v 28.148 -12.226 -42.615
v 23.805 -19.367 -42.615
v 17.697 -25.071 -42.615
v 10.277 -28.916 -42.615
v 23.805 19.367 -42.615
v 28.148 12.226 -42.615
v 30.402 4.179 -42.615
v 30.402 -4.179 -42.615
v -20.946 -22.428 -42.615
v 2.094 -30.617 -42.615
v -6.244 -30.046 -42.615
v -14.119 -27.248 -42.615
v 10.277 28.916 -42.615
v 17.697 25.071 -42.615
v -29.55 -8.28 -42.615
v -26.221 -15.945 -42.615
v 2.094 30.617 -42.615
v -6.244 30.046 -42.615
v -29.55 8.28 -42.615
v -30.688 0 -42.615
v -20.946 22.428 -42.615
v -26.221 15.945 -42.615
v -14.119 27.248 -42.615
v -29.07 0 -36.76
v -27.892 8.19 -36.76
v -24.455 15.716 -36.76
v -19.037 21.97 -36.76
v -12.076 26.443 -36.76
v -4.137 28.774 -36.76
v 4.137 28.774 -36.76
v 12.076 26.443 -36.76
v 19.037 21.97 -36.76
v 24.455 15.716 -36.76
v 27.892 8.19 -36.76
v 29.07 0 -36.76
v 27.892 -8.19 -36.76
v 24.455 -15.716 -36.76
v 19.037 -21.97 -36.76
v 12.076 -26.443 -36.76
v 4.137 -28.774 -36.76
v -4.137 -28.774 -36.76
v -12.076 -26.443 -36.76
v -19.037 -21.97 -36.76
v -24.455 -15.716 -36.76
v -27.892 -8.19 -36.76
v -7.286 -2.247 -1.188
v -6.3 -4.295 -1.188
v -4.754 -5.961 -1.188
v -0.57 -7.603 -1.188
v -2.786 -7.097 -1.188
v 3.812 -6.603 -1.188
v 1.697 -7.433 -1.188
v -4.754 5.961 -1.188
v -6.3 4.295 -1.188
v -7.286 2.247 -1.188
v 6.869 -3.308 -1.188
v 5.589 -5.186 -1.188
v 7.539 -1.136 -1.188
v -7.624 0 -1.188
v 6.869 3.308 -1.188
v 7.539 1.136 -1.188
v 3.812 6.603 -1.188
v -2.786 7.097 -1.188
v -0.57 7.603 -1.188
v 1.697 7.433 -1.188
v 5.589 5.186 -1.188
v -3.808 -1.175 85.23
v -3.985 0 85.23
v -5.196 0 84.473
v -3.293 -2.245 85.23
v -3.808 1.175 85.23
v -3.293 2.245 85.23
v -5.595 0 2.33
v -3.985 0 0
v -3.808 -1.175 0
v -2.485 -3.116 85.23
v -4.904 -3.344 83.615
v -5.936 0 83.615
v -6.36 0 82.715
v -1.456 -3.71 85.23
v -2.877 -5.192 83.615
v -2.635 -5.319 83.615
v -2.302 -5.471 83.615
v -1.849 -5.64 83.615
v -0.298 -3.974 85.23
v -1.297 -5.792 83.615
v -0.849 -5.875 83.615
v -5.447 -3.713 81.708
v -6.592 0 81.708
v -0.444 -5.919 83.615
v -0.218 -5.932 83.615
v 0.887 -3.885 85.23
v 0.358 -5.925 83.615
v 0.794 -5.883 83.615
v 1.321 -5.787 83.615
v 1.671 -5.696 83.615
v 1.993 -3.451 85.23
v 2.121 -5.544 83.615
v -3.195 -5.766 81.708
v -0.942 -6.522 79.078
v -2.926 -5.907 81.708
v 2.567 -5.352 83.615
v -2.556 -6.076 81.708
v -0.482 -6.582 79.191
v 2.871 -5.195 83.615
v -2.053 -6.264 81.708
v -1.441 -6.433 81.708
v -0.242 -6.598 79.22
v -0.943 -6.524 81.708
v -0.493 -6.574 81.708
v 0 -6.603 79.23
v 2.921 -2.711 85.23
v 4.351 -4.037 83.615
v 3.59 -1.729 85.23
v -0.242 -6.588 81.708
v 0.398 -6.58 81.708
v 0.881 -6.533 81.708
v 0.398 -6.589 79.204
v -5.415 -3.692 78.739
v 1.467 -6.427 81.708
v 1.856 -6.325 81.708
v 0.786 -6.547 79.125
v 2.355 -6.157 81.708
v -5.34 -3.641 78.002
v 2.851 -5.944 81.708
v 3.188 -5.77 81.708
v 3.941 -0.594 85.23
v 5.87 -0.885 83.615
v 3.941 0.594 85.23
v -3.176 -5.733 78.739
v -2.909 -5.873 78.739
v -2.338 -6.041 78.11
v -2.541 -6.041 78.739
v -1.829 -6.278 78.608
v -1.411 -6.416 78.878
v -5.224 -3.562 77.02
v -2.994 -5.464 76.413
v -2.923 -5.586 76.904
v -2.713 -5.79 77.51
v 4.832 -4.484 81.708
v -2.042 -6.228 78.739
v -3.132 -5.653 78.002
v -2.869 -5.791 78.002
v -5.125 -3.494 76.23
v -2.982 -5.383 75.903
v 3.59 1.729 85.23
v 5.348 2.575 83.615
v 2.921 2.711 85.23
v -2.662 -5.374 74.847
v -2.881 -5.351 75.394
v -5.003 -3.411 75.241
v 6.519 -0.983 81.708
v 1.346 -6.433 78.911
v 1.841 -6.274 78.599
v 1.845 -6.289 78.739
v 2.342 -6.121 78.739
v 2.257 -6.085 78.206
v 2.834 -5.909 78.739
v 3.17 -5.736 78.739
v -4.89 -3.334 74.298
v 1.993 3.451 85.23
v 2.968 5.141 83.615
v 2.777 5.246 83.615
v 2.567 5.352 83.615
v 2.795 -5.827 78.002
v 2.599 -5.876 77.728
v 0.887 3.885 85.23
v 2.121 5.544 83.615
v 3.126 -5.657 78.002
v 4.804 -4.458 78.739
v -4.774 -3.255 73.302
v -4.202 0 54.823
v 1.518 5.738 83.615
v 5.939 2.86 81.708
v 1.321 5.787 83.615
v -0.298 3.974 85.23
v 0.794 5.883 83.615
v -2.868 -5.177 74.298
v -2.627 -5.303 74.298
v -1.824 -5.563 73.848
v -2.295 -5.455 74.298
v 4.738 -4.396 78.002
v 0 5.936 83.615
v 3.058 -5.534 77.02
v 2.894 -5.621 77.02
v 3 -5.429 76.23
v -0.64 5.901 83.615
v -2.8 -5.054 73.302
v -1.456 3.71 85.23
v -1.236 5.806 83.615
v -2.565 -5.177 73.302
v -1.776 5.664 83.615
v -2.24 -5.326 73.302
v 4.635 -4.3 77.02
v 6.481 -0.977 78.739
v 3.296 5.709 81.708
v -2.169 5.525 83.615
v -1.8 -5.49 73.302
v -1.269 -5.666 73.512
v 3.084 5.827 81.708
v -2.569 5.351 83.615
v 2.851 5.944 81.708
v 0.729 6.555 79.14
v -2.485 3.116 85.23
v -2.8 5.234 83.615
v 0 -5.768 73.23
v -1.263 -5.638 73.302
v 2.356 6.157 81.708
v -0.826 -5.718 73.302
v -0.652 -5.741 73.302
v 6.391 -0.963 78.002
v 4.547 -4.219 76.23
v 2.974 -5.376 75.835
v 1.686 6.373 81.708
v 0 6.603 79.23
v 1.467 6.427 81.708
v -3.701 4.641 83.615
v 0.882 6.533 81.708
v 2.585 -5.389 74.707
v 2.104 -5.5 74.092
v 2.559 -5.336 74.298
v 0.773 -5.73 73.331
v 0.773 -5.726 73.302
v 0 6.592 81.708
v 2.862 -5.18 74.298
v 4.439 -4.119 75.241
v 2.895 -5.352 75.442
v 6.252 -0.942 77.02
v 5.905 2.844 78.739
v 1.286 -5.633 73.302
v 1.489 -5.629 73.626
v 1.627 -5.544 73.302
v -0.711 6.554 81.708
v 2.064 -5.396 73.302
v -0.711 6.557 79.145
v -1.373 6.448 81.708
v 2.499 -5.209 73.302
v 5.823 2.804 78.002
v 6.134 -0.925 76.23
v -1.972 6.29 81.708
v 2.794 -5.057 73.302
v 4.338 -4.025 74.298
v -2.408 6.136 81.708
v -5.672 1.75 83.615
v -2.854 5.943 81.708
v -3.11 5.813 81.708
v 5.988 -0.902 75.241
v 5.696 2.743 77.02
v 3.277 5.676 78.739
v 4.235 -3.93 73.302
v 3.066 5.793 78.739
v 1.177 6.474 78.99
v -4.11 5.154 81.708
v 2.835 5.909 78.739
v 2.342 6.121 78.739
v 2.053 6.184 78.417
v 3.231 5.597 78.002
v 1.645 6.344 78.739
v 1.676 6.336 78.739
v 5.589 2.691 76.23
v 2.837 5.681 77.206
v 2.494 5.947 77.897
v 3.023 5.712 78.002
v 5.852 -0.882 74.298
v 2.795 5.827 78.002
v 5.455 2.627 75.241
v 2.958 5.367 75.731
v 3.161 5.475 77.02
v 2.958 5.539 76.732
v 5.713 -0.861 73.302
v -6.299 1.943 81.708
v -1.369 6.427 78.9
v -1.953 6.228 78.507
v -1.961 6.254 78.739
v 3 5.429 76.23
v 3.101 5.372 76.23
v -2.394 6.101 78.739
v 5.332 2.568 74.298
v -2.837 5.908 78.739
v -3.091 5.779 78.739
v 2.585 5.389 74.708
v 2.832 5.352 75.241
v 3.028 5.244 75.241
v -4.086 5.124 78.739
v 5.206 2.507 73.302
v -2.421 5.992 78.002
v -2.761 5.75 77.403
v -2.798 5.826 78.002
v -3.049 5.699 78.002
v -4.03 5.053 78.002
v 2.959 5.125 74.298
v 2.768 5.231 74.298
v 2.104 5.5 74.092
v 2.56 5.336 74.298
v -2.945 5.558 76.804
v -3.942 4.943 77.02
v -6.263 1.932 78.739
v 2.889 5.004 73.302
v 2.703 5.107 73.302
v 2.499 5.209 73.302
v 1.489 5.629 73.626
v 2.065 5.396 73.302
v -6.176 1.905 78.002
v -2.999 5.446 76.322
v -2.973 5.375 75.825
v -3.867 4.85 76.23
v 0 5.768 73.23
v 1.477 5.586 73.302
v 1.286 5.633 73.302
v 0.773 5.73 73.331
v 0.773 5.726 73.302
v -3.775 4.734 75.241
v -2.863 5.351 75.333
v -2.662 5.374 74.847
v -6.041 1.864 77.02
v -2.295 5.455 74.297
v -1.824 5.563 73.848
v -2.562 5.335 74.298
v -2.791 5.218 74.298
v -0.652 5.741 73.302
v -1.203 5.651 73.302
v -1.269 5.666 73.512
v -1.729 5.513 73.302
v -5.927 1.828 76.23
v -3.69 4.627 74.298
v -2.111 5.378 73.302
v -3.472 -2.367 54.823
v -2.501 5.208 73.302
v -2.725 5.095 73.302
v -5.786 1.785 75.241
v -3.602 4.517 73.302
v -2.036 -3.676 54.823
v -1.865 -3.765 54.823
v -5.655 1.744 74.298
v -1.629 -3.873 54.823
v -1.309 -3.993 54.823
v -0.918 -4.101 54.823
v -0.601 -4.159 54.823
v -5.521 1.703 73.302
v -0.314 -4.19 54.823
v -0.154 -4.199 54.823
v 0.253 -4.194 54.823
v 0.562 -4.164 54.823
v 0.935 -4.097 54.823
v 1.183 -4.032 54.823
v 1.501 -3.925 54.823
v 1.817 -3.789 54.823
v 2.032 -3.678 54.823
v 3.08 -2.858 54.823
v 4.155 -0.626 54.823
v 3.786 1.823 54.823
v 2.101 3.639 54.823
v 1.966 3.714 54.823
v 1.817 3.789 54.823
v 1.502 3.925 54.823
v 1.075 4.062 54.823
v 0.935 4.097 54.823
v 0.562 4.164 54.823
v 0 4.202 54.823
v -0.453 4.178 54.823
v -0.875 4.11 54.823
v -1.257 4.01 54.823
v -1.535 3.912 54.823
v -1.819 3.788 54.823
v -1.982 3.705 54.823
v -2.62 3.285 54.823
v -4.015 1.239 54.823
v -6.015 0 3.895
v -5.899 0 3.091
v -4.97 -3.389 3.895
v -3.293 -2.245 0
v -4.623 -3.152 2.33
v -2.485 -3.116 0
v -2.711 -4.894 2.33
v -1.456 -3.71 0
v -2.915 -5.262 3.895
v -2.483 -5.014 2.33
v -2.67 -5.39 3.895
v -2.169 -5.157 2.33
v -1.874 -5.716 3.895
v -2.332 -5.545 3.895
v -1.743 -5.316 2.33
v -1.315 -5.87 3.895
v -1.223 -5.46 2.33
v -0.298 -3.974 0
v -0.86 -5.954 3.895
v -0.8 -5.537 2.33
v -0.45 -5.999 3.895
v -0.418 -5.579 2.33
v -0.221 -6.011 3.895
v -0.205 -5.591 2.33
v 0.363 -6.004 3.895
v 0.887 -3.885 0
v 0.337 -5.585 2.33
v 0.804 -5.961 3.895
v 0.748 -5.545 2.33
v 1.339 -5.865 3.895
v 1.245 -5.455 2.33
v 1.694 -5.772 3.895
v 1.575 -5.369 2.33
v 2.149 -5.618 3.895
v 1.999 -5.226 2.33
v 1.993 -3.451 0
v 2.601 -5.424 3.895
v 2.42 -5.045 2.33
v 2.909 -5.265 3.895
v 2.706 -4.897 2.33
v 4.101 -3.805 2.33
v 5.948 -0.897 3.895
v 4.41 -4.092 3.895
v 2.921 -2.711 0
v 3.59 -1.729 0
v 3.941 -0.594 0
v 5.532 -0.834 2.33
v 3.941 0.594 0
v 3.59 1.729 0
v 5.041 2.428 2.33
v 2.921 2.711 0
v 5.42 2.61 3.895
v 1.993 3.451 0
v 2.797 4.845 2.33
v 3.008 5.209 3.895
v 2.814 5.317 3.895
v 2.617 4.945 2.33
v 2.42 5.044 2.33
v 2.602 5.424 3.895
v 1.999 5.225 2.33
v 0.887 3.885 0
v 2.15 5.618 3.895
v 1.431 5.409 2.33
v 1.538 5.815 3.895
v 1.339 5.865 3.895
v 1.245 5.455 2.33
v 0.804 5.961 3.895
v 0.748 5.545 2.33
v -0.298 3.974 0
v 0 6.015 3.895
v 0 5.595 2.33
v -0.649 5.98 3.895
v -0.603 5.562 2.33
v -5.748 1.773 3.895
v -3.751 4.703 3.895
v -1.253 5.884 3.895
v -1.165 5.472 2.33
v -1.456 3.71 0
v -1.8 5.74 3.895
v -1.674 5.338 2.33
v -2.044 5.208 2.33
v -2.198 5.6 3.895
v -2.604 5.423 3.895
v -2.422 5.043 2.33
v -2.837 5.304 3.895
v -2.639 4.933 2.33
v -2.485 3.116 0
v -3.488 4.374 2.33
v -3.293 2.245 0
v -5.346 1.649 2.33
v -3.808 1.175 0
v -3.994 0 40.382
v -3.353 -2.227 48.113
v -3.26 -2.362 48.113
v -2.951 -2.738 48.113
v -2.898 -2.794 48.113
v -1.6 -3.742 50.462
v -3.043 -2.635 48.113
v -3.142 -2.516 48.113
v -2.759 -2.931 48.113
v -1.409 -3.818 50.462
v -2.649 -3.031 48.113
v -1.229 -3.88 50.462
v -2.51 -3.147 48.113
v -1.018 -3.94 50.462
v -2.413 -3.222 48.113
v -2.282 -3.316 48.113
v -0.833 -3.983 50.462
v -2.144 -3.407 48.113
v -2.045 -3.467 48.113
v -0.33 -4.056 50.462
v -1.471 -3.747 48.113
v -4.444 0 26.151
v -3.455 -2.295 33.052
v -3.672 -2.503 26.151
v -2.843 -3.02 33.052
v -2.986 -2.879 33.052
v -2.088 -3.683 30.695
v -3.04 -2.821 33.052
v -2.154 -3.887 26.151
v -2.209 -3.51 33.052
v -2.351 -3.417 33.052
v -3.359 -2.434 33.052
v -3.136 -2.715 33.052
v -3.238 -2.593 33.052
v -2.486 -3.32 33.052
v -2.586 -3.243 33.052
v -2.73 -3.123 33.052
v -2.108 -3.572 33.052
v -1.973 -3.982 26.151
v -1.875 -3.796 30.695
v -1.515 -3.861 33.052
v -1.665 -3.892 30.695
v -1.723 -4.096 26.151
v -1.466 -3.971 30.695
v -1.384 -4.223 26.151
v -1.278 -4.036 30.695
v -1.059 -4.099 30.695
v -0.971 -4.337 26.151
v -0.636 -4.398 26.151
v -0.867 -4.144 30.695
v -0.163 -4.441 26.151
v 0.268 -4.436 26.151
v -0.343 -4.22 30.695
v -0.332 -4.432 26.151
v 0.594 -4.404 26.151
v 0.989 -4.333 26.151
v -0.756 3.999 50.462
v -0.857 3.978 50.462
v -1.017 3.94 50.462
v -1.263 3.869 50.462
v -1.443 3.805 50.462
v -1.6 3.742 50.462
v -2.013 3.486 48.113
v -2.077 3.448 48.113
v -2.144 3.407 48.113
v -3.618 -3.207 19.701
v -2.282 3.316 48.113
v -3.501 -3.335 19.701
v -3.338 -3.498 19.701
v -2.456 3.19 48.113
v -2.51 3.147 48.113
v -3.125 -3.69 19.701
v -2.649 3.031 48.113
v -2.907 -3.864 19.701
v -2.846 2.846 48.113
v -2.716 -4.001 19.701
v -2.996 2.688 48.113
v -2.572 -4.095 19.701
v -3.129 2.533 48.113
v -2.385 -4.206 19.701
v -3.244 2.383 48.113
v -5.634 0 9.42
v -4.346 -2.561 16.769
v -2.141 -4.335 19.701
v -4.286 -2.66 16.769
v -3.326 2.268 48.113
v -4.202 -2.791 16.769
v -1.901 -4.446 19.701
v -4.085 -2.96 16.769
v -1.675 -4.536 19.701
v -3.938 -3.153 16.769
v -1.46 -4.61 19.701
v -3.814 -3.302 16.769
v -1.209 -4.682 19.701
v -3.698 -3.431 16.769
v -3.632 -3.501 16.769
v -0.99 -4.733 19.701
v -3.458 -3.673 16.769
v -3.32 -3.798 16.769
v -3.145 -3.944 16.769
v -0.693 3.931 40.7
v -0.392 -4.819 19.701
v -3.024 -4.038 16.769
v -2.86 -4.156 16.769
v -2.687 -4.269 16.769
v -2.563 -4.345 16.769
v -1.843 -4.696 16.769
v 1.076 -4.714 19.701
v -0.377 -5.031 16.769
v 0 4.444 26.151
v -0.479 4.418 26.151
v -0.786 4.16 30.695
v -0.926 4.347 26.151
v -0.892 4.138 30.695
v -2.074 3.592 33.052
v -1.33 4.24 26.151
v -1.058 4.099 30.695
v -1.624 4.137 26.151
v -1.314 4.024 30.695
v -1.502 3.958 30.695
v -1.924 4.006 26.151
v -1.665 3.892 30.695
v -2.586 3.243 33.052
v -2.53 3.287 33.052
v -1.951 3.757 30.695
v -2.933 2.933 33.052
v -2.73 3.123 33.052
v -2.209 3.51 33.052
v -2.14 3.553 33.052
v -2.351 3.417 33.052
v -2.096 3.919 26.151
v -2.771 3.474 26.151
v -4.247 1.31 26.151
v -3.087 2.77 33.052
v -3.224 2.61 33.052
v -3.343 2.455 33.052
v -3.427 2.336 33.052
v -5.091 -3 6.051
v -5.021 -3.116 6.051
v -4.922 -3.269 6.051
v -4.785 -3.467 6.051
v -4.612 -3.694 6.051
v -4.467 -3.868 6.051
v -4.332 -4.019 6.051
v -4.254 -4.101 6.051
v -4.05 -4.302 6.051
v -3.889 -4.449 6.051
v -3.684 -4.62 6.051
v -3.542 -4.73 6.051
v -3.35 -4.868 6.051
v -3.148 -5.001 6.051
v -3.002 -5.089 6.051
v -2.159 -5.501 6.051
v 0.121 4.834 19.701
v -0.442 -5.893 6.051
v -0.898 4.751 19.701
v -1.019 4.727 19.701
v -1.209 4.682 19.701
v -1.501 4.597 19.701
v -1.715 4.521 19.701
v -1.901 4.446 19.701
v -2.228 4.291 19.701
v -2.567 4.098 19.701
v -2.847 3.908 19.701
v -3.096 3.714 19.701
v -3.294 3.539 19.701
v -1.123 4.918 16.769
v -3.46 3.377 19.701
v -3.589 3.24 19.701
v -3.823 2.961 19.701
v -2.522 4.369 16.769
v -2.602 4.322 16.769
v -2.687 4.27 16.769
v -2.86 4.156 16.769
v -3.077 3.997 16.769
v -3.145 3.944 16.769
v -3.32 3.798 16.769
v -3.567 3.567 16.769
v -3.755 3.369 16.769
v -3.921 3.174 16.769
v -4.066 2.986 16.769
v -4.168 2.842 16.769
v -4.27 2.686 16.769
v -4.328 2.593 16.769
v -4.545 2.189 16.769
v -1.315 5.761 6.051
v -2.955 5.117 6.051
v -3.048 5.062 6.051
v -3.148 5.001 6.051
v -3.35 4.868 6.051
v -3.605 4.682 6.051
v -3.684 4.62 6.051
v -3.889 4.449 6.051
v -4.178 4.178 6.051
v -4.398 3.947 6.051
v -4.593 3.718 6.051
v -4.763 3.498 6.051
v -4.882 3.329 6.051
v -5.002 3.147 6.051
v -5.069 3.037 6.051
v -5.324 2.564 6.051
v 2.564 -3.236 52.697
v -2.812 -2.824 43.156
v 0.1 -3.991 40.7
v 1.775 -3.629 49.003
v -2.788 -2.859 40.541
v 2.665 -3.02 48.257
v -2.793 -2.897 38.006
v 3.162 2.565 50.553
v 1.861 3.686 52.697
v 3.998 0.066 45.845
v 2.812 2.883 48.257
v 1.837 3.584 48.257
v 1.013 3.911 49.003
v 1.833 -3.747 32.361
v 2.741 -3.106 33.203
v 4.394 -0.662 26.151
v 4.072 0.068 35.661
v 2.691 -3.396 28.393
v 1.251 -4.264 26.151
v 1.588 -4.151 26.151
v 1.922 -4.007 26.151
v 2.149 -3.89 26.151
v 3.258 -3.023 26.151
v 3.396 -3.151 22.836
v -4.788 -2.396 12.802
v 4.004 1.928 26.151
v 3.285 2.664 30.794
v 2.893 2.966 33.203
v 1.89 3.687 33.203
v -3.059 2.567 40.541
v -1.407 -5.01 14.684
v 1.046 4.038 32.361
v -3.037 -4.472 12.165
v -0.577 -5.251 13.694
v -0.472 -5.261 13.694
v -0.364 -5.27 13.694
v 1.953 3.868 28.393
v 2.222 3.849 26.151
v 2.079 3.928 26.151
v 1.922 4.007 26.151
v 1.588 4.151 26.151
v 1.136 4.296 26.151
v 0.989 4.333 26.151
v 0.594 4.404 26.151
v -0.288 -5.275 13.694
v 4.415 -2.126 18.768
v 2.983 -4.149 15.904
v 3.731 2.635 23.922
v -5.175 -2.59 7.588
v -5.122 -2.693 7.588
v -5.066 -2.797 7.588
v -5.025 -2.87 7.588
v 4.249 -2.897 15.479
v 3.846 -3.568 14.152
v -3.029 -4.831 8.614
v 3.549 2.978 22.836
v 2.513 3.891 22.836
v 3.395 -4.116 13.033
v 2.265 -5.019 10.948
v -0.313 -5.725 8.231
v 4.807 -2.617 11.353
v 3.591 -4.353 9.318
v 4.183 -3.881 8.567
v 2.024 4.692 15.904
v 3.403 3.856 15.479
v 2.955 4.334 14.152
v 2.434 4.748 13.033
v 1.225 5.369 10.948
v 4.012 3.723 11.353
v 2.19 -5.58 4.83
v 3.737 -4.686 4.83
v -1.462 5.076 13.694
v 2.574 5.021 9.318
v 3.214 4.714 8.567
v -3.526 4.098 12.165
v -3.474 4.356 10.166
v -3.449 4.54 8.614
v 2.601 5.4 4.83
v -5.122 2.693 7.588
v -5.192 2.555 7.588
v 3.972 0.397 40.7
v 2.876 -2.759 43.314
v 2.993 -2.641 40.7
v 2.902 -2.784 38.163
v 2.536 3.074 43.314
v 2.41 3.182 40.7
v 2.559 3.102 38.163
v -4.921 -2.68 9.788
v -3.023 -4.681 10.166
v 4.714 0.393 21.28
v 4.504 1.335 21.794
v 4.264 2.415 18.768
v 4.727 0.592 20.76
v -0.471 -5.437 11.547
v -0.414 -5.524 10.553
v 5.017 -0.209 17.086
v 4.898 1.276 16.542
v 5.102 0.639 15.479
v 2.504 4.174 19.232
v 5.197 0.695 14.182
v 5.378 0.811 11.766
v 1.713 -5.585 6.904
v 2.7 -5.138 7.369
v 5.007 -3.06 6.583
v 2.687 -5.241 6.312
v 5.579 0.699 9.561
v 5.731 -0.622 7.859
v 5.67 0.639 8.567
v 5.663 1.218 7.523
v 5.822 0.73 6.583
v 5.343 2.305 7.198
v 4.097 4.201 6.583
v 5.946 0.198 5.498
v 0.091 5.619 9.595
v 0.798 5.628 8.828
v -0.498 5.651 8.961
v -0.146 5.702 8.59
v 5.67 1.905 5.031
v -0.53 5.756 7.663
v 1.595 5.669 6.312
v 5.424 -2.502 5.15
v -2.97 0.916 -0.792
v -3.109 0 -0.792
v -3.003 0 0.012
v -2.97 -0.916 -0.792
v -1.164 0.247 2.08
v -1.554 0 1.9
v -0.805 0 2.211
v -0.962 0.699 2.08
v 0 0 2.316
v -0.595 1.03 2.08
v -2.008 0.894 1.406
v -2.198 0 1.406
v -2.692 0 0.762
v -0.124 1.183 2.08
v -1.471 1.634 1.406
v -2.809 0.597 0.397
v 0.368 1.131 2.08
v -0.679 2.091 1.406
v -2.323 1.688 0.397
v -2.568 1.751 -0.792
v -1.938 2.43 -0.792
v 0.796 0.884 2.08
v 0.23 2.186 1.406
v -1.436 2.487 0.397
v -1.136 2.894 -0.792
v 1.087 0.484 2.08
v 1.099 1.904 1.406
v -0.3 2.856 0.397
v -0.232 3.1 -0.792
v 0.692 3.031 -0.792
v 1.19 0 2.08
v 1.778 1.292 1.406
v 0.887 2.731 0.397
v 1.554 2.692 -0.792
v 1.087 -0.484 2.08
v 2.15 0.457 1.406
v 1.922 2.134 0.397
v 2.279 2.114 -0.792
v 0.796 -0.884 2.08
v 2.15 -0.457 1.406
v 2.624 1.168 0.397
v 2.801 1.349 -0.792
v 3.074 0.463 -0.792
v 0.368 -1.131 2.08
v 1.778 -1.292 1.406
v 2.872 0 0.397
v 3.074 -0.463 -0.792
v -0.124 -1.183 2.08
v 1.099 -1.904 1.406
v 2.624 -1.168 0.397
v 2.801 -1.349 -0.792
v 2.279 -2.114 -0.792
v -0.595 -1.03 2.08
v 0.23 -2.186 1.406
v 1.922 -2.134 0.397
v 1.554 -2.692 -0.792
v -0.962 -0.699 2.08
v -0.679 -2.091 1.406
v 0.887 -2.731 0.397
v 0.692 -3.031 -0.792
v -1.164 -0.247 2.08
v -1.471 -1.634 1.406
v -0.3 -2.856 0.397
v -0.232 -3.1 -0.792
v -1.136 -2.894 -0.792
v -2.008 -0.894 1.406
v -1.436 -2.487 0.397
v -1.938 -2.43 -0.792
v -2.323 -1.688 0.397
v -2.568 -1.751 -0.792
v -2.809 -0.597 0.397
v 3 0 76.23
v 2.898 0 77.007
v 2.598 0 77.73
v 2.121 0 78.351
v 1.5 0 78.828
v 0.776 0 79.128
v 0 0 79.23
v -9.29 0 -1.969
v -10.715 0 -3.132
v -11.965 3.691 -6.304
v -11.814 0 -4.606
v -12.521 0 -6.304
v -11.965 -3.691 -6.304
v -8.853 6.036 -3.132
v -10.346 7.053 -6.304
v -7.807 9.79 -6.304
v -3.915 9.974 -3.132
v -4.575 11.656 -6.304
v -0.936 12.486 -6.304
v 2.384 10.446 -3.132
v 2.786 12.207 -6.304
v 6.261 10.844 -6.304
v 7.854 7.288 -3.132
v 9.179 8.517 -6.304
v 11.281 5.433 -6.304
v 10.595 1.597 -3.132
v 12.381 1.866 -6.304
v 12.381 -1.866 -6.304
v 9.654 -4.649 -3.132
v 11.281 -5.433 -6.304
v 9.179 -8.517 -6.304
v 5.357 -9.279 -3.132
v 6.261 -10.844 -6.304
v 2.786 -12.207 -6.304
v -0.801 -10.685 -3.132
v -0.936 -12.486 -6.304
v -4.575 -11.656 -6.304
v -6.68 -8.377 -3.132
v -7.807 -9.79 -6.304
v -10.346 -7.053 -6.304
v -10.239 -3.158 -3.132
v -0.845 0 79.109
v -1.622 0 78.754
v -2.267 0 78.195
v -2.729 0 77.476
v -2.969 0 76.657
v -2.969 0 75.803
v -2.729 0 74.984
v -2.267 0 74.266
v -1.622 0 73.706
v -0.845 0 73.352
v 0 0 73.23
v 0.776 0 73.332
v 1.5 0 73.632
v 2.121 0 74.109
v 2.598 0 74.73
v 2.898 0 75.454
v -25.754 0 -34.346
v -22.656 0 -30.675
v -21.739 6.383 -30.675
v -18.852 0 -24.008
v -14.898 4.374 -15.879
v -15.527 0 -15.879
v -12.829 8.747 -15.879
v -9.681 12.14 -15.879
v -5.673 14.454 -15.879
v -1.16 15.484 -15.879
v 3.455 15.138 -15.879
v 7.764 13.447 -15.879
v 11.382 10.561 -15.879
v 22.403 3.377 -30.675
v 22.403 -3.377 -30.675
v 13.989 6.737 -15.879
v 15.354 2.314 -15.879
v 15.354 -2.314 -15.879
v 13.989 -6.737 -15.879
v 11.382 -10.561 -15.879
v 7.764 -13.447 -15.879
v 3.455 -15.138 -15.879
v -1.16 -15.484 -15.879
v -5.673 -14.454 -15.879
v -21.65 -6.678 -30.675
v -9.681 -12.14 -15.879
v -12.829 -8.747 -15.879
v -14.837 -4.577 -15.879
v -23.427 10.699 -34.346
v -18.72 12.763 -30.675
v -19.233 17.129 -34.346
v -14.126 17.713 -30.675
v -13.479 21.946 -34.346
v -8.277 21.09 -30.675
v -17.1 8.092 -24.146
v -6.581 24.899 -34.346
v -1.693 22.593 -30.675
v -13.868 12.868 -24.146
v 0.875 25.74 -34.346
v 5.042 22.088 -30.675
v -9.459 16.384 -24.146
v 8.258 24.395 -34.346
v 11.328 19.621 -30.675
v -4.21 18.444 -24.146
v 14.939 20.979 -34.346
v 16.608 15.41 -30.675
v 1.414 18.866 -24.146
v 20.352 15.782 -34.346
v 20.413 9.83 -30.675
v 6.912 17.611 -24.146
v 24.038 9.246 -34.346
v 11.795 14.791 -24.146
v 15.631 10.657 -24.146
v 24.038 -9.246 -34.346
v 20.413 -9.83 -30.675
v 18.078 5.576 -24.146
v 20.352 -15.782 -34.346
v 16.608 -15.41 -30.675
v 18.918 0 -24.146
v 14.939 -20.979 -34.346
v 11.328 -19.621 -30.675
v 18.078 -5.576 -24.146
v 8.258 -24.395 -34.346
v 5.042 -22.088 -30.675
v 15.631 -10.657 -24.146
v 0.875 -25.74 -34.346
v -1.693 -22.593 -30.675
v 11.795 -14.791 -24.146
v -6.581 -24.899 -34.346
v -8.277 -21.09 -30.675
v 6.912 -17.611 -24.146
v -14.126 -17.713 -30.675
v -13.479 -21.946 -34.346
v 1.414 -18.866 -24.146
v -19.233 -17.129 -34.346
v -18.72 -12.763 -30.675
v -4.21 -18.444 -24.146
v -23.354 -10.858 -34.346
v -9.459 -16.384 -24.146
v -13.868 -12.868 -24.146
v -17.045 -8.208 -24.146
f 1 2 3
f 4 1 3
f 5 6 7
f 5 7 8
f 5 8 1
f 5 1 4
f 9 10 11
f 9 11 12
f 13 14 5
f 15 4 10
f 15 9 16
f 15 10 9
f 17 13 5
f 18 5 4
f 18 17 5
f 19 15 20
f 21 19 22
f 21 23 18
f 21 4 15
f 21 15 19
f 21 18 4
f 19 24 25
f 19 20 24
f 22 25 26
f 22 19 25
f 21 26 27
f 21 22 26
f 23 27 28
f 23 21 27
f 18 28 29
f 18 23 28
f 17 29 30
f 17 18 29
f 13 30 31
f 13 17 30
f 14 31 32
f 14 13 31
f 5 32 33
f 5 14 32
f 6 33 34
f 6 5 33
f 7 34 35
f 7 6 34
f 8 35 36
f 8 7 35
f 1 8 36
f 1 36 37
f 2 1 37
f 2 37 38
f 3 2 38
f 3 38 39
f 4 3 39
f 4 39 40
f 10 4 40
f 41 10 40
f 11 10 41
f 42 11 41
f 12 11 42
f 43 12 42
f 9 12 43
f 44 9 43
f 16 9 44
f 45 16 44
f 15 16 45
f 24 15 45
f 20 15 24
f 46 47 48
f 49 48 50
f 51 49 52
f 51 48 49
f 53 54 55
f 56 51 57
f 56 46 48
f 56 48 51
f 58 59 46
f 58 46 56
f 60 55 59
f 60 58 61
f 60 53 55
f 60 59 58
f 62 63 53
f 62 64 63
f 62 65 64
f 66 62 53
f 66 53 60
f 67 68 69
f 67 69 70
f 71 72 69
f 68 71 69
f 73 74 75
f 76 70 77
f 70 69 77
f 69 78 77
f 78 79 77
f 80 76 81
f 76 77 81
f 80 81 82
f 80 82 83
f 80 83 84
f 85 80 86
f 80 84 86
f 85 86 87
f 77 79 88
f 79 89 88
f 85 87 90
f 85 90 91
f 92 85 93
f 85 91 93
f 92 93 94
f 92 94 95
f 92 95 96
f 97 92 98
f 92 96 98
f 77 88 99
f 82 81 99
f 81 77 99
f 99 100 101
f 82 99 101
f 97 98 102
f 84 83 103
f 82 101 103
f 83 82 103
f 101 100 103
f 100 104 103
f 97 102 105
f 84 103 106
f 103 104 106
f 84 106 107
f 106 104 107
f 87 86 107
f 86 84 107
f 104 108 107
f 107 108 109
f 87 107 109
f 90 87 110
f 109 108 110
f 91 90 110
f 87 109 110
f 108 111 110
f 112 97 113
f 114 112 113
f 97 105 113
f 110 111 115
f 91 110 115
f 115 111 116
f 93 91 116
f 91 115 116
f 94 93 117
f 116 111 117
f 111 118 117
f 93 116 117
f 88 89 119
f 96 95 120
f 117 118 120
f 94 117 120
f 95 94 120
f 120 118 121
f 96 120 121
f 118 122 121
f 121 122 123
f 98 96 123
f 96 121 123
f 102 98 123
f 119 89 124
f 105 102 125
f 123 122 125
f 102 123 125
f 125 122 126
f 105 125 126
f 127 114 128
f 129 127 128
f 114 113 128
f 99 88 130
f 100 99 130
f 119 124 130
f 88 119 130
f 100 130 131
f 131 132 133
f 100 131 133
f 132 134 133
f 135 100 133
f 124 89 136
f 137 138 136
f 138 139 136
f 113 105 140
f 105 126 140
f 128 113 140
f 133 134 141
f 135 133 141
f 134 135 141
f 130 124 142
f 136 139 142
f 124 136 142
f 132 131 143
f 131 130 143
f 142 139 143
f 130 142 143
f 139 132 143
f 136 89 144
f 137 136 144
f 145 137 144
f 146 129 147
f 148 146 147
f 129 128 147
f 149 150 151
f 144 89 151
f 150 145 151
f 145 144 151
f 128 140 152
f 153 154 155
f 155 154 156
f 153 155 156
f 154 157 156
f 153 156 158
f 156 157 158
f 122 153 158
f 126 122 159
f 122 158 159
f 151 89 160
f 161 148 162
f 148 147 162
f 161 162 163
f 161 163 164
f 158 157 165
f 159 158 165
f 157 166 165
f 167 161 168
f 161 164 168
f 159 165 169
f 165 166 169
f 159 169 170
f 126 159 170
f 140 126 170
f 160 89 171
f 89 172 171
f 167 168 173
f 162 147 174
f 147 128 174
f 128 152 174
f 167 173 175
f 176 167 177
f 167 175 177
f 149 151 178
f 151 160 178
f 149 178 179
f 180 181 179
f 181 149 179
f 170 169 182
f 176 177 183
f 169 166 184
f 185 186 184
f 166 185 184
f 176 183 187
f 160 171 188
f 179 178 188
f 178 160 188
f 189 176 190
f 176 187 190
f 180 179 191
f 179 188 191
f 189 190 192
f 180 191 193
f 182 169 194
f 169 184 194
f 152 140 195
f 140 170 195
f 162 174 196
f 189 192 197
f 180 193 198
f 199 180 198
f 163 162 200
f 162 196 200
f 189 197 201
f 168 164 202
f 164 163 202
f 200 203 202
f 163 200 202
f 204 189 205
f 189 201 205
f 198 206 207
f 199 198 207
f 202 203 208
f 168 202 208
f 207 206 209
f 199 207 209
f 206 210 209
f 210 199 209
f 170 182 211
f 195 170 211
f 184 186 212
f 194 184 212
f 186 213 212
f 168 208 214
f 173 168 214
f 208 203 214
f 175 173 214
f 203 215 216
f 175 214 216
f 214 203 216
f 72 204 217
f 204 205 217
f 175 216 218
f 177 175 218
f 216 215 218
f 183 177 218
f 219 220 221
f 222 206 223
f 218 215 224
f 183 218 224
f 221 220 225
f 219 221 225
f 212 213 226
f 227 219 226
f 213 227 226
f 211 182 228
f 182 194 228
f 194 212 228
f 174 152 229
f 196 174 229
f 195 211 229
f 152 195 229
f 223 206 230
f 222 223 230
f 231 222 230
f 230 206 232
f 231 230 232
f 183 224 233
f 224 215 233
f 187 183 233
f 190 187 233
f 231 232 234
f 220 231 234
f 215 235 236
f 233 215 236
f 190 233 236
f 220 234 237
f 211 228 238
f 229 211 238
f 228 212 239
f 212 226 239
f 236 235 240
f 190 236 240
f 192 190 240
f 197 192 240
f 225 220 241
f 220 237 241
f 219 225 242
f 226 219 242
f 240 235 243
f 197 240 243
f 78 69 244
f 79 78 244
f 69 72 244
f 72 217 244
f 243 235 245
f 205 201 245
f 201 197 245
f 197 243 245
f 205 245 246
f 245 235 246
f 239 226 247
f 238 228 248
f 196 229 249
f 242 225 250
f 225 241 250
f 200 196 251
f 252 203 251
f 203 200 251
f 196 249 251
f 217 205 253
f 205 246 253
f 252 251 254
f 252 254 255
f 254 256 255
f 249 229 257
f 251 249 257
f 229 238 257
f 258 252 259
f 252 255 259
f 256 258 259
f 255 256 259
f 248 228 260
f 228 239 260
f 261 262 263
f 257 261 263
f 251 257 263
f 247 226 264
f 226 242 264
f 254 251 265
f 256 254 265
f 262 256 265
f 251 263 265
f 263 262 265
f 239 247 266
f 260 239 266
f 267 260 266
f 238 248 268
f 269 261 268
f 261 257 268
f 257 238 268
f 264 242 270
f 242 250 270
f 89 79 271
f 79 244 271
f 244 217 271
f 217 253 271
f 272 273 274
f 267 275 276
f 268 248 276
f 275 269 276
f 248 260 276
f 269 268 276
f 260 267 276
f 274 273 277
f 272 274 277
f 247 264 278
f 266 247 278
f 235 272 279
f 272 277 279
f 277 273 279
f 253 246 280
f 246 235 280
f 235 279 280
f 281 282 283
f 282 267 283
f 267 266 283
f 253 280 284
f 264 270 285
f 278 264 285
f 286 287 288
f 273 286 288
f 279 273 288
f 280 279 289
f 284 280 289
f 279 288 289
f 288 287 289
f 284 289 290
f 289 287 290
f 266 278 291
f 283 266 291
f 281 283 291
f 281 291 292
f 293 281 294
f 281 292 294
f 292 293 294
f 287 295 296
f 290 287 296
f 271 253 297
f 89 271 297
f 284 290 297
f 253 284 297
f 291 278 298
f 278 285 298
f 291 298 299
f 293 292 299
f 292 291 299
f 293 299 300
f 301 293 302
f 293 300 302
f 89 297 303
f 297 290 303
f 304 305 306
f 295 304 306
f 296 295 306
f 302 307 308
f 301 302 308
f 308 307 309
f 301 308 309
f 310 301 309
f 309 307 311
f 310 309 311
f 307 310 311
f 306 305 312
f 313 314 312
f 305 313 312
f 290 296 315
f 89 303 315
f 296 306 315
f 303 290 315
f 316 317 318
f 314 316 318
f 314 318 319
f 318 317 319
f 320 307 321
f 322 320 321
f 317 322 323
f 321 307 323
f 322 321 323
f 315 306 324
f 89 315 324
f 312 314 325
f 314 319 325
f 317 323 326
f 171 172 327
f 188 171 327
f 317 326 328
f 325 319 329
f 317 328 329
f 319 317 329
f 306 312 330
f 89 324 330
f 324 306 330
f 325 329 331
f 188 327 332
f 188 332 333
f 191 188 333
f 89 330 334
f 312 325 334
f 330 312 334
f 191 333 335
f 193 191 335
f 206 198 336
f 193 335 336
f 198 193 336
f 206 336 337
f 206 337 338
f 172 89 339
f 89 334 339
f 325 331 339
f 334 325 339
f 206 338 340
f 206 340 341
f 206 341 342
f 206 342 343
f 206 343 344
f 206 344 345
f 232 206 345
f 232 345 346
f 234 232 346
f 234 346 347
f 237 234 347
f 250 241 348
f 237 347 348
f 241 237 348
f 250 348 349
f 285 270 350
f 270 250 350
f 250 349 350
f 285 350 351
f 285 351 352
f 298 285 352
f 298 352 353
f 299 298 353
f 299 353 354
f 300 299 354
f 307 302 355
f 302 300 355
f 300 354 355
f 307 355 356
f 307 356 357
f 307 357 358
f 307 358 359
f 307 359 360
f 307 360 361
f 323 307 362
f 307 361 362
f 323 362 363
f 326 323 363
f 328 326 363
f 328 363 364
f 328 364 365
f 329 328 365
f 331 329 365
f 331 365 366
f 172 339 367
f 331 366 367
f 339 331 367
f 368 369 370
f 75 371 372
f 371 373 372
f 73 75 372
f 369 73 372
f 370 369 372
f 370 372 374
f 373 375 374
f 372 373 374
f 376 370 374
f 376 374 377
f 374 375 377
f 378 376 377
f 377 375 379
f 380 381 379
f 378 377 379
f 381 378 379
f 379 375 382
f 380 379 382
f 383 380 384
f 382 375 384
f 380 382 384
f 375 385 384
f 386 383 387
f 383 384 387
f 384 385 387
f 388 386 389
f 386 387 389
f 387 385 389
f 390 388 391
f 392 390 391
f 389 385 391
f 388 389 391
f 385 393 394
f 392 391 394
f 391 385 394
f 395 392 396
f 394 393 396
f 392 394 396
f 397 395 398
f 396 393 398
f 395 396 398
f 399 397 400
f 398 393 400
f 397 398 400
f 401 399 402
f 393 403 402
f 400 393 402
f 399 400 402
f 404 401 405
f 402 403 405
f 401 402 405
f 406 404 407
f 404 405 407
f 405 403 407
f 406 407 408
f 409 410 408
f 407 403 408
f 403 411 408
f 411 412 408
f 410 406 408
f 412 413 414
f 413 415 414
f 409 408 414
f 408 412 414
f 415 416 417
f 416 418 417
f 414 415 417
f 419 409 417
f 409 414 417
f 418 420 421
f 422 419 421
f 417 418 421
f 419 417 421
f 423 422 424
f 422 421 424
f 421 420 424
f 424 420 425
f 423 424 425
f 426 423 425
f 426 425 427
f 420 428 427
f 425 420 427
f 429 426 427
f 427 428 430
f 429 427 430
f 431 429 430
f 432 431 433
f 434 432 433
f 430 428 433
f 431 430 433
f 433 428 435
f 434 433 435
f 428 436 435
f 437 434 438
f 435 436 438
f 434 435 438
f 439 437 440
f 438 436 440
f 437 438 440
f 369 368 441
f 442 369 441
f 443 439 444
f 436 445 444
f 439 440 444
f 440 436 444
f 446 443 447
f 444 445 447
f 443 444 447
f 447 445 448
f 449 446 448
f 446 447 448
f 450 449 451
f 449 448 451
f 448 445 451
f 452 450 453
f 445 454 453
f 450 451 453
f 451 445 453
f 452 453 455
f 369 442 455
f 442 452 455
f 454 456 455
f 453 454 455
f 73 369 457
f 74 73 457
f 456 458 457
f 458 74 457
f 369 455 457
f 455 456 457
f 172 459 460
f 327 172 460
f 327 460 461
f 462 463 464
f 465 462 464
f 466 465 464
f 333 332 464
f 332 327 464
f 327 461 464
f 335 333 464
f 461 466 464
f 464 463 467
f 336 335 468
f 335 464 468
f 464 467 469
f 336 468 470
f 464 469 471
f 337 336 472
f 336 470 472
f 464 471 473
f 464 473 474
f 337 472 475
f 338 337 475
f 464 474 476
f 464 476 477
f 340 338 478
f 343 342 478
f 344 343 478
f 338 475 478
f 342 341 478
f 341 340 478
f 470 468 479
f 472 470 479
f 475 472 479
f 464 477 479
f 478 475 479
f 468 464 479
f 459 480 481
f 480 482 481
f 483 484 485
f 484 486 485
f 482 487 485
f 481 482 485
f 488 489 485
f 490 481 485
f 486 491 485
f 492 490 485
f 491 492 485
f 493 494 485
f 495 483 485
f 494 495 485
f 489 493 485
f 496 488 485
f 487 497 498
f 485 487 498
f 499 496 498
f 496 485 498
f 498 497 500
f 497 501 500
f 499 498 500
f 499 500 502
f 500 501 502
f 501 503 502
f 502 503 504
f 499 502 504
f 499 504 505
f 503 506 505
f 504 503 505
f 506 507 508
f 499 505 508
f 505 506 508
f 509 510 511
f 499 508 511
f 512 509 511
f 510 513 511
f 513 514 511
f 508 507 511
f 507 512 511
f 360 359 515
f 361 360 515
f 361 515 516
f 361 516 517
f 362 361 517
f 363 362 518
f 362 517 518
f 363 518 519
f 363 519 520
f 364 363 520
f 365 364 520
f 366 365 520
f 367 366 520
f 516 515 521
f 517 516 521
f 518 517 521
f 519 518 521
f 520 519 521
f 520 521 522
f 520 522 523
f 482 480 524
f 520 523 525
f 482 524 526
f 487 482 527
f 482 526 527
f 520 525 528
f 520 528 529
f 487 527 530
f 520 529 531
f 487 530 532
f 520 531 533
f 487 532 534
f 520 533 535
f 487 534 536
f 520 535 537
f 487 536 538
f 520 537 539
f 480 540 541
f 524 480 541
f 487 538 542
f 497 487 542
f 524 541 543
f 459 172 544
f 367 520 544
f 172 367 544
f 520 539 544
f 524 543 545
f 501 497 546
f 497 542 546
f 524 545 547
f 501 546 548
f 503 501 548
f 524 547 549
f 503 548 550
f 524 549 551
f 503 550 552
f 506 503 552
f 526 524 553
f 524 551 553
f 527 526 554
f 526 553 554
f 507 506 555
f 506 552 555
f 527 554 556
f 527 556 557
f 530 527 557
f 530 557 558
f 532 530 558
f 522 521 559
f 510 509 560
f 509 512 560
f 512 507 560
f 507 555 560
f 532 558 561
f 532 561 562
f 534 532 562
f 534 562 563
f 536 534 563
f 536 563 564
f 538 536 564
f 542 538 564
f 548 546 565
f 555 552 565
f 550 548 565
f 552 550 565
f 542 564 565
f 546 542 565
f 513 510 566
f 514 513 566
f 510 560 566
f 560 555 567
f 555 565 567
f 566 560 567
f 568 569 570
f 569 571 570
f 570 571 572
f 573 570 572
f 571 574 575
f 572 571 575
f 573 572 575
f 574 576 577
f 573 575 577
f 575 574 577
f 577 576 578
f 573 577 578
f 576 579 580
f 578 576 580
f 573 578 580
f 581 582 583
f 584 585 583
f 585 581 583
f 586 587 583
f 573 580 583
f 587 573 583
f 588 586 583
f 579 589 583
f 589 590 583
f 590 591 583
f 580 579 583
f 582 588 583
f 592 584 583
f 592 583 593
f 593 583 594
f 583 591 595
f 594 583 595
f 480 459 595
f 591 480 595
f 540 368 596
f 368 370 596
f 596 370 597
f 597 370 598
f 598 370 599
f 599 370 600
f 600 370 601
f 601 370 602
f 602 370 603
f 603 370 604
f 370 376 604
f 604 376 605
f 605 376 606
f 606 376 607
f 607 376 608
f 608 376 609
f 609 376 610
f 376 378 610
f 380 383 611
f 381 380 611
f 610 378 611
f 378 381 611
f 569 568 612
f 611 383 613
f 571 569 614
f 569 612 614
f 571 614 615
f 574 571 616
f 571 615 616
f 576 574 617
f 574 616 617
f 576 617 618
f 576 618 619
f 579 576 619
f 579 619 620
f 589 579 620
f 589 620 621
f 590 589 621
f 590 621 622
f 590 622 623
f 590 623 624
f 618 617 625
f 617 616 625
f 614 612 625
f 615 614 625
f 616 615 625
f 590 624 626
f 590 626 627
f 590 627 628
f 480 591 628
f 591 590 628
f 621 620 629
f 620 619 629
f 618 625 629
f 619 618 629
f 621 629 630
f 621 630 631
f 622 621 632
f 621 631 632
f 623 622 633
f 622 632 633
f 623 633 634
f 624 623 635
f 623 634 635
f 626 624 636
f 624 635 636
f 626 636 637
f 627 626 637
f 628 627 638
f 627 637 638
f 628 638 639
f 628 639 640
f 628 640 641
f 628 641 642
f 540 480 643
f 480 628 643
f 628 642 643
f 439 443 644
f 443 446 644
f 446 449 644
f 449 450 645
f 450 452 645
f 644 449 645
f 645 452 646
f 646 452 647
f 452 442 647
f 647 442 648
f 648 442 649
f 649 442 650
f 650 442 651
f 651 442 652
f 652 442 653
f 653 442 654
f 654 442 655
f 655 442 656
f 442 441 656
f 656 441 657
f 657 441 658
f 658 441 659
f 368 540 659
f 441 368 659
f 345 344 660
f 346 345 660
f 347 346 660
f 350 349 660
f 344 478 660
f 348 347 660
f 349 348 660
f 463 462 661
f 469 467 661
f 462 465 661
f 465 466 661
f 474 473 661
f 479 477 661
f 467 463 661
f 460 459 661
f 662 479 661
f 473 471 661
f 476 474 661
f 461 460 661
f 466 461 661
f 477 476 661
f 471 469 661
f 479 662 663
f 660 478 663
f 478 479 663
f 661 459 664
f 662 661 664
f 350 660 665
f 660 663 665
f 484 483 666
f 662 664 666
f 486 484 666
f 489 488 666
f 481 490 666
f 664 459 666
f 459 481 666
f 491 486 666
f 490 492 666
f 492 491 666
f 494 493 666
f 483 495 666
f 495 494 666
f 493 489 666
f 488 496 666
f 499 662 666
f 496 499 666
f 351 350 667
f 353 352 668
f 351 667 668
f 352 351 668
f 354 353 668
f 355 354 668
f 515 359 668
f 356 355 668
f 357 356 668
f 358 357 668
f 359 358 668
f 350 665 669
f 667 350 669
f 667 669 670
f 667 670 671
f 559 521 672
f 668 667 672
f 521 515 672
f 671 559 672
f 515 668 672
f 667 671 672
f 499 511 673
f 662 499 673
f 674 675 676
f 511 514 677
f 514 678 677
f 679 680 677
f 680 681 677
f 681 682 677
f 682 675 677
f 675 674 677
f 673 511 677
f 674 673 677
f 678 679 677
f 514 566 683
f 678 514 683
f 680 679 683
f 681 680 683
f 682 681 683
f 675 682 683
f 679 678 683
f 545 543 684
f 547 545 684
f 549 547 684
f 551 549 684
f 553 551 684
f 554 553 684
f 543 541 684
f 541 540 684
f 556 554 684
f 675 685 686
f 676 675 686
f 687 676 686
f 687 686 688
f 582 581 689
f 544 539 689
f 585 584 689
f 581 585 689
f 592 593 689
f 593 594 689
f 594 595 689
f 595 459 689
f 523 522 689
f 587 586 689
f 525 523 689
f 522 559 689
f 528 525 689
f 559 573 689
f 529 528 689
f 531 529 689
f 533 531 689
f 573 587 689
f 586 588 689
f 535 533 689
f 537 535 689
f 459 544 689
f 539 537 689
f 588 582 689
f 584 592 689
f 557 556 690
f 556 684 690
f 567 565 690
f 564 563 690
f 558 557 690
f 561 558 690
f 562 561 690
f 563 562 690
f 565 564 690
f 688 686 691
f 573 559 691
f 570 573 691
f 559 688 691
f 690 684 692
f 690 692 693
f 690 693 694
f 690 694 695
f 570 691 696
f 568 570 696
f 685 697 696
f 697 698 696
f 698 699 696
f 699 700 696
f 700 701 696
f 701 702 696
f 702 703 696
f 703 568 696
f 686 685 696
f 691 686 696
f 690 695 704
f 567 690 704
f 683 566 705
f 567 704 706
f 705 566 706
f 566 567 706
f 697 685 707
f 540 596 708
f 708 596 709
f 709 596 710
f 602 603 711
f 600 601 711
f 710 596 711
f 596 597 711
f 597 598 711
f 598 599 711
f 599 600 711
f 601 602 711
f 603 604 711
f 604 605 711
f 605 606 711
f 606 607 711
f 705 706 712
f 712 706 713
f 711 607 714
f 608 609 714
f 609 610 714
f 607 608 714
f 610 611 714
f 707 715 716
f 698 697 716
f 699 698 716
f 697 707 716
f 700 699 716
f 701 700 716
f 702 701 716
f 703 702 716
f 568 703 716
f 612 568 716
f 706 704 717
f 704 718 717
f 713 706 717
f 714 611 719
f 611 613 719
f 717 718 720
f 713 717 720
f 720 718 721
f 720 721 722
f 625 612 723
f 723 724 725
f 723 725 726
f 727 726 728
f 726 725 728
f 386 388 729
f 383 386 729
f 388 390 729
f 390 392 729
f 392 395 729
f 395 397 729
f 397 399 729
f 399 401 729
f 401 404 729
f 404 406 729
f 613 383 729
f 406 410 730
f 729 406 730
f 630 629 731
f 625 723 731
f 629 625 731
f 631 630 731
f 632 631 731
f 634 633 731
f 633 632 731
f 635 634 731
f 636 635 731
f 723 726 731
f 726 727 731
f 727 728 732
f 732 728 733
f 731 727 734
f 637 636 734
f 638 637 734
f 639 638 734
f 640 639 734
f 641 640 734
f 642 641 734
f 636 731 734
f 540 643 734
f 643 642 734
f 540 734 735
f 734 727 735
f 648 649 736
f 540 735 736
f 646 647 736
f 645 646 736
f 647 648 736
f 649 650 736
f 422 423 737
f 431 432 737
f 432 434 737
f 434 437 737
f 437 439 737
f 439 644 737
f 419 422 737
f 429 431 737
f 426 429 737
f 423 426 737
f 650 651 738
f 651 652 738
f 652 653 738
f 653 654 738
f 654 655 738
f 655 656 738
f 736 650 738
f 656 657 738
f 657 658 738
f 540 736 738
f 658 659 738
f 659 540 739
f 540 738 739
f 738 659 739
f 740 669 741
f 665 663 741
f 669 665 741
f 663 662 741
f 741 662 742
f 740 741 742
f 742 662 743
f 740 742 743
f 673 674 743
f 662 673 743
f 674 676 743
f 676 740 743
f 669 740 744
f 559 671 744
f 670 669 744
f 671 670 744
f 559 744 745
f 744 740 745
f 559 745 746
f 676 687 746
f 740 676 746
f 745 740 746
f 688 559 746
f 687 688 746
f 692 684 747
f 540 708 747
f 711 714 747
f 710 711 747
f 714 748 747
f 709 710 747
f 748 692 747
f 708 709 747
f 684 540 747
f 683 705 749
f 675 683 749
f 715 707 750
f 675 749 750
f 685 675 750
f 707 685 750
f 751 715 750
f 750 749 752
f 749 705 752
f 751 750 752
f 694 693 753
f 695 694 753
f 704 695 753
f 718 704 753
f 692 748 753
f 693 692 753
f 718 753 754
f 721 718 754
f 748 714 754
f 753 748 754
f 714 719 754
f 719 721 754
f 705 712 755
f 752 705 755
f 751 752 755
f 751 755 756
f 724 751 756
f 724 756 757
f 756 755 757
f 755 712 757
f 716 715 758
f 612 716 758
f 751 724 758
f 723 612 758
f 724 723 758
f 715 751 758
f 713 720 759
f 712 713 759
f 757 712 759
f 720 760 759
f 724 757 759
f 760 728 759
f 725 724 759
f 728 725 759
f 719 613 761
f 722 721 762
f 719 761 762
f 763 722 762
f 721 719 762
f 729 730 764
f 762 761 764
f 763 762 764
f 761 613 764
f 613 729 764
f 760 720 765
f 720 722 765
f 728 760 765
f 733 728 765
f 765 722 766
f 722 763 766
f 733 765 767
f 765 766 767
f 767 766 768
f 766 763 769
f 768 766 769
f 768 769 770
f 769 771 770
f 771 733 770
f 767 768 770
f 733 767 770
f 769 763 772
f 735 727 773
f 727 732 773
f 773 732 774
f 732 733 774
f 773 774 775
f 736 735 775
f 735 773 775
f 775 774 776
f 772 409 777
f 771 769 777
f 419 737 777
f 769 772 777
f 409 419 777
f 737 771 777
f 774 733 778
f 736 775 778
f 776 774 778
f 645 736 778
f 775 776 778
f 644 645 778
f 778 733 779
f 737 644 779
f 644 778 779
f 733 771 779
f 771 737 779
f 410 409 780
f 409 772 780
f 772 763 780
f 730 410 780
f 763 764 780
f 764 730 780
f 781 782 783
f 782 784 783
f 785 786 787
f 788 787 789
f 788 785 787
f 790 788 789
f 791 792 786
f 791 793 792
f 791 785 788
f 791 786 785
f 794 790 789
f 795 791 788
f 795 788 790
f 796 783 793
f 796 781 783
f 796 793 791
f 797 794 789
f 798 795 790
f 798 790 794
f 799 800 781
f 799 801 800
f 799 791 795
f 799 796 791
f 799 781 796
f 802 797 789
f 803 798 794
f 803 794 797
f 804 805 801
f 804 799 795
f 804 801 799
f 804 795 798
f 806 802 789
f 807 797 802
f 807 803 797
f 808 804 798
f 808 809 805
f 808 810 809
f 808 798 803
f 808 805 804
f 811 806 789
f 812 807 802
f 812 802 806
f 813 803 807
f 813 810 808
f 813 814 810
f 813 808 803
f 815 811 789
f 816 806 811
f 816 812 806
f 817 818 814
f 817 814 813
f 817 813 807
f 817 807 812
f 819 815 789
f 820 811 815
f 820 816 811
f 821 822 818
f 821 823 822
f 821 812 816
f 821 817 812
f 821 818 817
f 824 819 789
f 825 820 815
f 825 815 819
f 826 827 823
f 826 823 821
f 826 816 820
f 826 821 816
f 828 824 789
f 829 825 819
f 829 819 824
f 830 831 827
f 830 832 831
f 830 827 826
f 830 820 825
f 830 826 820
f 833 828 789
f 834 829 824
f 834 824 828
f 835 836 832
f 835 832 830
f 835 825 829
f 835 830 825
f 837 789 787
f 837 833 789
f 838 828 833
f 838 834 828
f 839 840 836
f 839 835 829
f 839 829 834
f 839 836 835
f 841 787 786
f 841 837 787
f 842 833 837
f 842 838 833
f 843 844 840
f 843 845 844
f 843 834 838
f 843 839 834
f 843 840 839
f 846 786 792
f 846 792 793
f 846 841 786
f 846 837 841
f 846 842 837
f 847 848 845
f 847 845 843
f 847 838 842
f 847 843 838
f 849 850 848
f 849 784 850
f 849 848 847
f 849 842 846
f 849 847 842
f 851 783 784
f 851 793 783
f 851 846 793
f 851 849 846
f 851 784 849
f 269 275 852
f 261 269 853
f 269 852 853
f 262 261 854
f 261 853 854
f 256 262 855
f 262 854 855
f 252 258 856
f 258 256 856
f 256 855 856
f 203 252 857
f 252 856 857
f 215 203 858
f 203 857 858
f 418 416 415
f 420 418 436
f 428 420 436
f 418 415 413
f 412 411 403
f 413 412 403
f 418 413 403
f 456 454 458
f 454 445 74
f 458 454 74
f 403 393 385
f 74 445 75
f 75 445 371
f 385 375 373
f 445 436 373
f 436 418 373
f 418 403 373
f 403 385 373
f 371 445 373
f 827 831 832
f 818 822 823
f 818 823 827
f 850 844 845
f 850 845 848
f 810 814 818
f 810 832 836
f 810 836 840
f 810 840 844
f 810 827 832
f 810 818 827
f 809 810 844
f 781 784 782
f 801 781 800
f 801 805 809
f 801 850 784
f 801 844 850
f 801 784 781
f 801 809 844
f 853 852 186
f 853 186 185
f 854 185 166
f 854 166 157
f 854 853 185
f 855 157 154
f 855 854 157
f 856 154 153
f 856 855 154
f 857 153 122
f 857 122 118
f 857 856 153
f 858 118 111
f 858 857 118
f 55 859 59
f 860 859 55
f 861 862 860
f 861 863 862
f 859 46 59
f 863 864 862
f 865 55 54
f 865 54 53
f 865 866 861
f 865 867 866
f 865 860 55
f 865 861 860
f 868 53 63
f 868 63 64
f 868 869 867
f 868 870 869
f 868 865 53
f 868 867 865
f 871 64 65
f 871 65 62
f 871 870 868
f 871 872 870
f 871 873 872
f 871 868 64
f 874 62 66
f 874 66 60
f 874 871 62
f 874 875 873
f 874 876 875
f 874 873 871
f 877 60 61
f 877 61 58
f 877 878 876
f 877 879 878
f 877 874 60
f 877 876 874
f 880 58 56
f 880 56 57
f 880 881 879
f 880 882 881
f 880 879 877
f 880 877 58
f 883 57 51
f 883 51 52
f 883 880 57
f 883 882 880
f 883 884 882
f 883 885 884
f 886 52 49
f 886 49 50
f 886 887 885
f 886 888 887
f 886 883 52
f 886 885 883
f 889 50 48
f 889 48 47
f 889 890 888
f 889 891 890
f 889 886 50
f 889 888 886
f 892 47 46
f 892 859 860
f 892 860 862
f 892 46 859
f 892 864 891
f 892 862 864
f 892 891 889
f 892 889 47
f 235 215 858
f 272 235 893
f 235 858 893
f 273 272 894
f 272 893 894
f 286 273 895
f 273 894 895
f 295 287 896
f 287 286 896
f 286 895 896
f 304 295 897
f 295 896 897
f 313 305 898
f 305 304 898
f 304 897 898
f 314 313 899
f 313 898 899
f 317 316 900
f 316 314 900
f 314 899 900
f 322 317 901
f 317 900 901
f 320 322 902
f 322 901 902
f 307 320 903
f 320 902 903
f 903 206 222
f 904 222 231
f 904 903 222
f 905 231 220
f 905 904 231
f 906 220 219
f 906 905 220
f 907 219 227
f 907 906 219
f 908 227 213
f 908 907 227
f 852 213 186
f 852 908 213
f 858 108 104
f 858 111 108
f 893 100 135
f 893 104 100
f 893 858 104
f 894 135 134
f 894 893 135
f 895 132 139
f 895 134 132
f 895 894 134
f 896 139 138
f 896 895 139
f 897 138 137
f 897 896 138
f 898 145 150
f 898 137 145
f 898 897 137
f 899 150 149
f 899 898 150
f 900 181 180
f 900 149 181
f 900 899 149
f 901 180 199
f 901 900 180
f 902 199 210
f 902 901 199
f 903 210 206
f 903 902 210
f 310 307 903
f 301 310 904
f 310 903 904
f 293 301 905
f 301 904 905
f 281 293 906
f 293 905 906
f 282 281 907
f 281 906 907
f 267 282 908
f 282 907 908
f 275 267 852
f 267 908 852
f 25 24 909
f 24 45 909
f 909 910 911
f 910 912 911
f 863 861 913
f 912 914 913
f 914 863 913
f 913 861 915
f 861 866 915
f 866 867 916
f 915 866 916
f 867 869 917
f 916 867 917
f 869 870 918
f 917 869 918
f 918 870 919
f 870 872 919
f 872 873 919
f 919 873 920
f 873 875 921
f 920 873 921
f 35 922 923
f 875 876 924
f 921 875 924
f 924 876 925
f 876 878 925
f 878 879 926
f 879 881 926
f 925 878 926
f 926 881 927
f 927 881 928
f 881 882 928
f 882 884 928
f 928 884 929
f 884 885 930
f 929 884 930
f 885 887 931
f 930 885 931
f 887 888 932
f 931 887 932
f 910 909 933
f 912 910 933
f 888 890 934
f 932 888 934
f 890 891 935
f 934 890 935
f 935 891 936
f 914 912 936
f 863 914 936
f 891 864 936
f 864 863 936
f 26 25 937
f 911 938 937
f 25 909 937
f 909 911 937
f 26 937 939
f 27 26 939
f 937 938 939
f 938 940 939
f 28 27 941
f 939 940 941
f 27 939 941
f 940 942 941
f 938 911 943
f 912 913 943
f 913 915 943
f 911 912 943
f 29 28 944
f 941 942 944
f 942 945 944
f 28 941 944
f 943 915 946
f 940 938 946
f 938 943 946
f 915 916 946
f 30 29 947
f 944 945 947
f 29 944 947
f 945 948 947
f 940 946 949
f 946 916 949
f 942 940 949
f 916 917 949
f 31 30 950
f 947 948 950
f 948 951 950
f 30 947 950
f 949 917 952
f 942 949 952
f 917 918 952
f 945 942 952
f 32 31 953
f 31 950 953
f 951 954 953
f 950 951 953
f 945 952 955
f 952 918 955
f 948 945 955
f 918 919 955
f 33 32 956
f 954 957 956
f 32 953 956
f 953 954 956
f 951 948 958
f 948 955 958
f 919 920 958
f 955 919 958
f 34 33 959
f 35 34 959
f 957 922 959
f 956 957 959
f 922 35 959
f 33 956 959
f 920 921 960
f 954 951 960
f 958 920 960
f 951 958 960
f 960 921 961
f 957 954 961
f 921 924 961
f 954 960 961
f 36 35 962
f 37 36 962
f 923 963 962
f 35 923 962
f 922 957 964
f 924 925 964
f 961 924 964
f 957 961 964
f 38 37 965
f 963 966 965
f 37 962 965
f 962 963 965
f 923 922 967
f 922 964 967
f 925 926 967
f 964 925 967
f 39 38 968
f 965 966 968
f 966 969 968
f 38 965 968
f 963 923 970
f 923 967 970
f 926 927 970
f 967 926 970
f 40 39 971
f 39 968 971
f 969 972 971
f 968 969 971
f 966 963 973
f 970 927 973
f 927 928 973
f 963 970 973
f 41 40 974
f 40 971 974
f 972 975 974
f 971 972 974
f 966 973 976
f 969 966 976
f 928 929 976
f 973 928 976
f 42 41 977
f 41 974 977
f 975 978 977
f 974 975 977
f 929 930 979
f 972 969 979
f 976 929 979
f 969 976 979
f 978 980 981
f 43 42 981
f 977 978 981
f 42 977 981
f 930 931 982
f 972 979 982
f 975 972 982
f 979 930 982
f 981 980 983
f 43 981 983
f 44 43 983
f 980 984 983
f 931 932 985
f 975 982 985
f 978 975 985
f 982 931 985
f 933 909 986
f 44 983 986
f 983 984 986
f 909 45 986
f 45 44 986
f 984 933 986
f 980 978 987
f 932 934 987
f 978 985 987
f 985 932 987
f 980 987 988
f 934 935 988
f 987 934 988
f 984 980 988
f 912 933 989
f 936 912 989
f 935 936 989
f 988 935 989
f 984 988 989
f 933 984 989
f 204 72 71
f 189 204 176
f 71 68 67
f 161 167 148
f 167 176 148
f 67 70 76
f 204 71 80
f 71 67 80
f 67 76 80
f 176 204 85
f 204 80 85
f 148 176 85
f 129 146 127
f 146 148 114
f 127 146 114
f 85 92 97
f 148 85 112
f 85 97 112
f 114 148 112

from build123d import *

# Parameters (mm, degrees)
F4_DEPTH      = 20.4598007182
F4_DEPTH_BACK = 20.4598007182
F5_SCALE      = 1.5


with BuildPart() as f2:
    # F0 (on Front) → F2 (revolve)
    with BuildSketch(Plane.XZ):
        with BuildLine():
            Line((0, 52.8200916865), (0, 56.8200916865))
            Line((0, 56.8200916865), (-2.6567221031, 56.8200916865))
            add(Edge.make_bspline(
                [(-2.6567221031, 56.8200916865), (-4.9406119586, 55.7945389978), (-3.7554478853, 48.9748373725), (-2.6567221031, 39.776578042), (-2.6567221031, 28.4100458433)],
                knots=[0, 0, 0, 0, 0.3440670063, 1, 1, 1, 1], degree=3))
            add(Edge.make_bspline(
                [(-2.6567221031, 28.4100458433), (-2.6567221031, 17.0435136445), (-4.1904992058, 2.8458600862), (-4.0253015772, 1.7695360087), (-2.6567221031, 0)],
                knots=[0, 0, 0, 0, 0.7250692185, 1, 1, 1, 1], degree=3))
            Line((-2.6567221031, 0), (0, 0))
            Line((0, 0), (0, 48.8200916865))
            ThreePointArc((0, 48.8200916865), (-2, 50.8200916865), (0, 52.8200916865))
        make_face()
    revolve(axis=Axis((0, 0, 28.4100458433), (0, 0, 1)))

    # F0 (on Front) → F4 (cut, two sides)
    with BuildSketch(Plane.XZ) as f4_sk:
        with BuildLine():
            Line((0, 50.8200916865), (0, 52.8200916865))
            ThreePointArc((0, 52.8200916865), (-2, 50.8200916865), (0, 48.8200916865))
            Line((0, 48.8200916865), (0, 50.8200916865))
        make_face()
        with BuildLine():
            ThreePointArc((2, 50.8200916865), (1.4142135624, 52.2343052489), (0, 52.8200916865))
            Line((0, 52.8200916865), (0, 50.8200916865))
            Line((0, 50.8200916865), (0, 48.8200916865))
            ThreePointArc((0, 48.8200916865), (1.4142135624, 49.4058781241), (2, 50.8200916865))
        make_face()
    extrude(amount=F4_DEPTH, mode=Mode.SUBTRACT)
    extrude(f4_sk.sketch, amount=-F4_DEPTH_BACK, mode=Mode.SUBTRACT)


with BuildPart() as f3:
    # F0 (on Front) → F3 (revolve)
    with BuildSketch(Plane.XZ):
        with BuildLine():
            Line((0, -28.4100458433), (0, -0.7921268718))
            Line((0, -0.7921268718), (-5.0829817209, -0.7921268718))
            ThreePointArc((-5.0829817209, -0.7921268718), (-7.143101465, -2.087757465), (-8.347522339, -4.2024967757))
            add(Edge.make_bspline(
                [(-19.3798802793, -24.5066192001), (-14.8855797897, -22.20953008), (-11.2581184189, -14.6427437723), (-8.347522339, -4.2024967757)],
                knots=[0, 0, 0, 0, 23.7906508382, 23.7906508382, 23.7906508382, 23.7906508382], degree=3))
            Line((-19.3798802793, -24.5066192001), (-20.4588007182, -28.4100458433))
            Line((-20.4588007182, -28.4100458433), (0, -28.4100458433))
        make_face()
    revolve(axis=Axis((0, 0, -14.2050229216), (0, 0, -1)))


with BuildPart() as f3_1:
    # F5: moved
    add(f3.part.scale(F5_SCALE))


with BuildPart() as f2_1:
    # F5: moved
    add(f2.part.scale(F5_SCALE))

    # F7: cut F3
    add(f3_1.part, mode=Mode.SUBTRACT)


with BuildPart() as f6:
    # F1 (on Front) → F6 (revolve)
    with BuildSketch(Plane.XZ):
        with BuildLine():
            Line((0, -0.7921268718), (0, 2.3164544235))
            ThreePointArc((0, 2.3164544235), (-2.1980989137, 1.405972042), (-3.1085812952, -0.7921268718))
            Line((-3.1085812952, -0.7921268718), (0, -0.7921268718))
        make_face()
    revolve(axis=Axis((0, 0, -14.2050229216), (0, 0, -1)))


with BuildPart() as f2_2:
    # F8: moved
    add(f2_1.part)


solid = Compound([f3_1.part, f6.part, f2_2.part])
